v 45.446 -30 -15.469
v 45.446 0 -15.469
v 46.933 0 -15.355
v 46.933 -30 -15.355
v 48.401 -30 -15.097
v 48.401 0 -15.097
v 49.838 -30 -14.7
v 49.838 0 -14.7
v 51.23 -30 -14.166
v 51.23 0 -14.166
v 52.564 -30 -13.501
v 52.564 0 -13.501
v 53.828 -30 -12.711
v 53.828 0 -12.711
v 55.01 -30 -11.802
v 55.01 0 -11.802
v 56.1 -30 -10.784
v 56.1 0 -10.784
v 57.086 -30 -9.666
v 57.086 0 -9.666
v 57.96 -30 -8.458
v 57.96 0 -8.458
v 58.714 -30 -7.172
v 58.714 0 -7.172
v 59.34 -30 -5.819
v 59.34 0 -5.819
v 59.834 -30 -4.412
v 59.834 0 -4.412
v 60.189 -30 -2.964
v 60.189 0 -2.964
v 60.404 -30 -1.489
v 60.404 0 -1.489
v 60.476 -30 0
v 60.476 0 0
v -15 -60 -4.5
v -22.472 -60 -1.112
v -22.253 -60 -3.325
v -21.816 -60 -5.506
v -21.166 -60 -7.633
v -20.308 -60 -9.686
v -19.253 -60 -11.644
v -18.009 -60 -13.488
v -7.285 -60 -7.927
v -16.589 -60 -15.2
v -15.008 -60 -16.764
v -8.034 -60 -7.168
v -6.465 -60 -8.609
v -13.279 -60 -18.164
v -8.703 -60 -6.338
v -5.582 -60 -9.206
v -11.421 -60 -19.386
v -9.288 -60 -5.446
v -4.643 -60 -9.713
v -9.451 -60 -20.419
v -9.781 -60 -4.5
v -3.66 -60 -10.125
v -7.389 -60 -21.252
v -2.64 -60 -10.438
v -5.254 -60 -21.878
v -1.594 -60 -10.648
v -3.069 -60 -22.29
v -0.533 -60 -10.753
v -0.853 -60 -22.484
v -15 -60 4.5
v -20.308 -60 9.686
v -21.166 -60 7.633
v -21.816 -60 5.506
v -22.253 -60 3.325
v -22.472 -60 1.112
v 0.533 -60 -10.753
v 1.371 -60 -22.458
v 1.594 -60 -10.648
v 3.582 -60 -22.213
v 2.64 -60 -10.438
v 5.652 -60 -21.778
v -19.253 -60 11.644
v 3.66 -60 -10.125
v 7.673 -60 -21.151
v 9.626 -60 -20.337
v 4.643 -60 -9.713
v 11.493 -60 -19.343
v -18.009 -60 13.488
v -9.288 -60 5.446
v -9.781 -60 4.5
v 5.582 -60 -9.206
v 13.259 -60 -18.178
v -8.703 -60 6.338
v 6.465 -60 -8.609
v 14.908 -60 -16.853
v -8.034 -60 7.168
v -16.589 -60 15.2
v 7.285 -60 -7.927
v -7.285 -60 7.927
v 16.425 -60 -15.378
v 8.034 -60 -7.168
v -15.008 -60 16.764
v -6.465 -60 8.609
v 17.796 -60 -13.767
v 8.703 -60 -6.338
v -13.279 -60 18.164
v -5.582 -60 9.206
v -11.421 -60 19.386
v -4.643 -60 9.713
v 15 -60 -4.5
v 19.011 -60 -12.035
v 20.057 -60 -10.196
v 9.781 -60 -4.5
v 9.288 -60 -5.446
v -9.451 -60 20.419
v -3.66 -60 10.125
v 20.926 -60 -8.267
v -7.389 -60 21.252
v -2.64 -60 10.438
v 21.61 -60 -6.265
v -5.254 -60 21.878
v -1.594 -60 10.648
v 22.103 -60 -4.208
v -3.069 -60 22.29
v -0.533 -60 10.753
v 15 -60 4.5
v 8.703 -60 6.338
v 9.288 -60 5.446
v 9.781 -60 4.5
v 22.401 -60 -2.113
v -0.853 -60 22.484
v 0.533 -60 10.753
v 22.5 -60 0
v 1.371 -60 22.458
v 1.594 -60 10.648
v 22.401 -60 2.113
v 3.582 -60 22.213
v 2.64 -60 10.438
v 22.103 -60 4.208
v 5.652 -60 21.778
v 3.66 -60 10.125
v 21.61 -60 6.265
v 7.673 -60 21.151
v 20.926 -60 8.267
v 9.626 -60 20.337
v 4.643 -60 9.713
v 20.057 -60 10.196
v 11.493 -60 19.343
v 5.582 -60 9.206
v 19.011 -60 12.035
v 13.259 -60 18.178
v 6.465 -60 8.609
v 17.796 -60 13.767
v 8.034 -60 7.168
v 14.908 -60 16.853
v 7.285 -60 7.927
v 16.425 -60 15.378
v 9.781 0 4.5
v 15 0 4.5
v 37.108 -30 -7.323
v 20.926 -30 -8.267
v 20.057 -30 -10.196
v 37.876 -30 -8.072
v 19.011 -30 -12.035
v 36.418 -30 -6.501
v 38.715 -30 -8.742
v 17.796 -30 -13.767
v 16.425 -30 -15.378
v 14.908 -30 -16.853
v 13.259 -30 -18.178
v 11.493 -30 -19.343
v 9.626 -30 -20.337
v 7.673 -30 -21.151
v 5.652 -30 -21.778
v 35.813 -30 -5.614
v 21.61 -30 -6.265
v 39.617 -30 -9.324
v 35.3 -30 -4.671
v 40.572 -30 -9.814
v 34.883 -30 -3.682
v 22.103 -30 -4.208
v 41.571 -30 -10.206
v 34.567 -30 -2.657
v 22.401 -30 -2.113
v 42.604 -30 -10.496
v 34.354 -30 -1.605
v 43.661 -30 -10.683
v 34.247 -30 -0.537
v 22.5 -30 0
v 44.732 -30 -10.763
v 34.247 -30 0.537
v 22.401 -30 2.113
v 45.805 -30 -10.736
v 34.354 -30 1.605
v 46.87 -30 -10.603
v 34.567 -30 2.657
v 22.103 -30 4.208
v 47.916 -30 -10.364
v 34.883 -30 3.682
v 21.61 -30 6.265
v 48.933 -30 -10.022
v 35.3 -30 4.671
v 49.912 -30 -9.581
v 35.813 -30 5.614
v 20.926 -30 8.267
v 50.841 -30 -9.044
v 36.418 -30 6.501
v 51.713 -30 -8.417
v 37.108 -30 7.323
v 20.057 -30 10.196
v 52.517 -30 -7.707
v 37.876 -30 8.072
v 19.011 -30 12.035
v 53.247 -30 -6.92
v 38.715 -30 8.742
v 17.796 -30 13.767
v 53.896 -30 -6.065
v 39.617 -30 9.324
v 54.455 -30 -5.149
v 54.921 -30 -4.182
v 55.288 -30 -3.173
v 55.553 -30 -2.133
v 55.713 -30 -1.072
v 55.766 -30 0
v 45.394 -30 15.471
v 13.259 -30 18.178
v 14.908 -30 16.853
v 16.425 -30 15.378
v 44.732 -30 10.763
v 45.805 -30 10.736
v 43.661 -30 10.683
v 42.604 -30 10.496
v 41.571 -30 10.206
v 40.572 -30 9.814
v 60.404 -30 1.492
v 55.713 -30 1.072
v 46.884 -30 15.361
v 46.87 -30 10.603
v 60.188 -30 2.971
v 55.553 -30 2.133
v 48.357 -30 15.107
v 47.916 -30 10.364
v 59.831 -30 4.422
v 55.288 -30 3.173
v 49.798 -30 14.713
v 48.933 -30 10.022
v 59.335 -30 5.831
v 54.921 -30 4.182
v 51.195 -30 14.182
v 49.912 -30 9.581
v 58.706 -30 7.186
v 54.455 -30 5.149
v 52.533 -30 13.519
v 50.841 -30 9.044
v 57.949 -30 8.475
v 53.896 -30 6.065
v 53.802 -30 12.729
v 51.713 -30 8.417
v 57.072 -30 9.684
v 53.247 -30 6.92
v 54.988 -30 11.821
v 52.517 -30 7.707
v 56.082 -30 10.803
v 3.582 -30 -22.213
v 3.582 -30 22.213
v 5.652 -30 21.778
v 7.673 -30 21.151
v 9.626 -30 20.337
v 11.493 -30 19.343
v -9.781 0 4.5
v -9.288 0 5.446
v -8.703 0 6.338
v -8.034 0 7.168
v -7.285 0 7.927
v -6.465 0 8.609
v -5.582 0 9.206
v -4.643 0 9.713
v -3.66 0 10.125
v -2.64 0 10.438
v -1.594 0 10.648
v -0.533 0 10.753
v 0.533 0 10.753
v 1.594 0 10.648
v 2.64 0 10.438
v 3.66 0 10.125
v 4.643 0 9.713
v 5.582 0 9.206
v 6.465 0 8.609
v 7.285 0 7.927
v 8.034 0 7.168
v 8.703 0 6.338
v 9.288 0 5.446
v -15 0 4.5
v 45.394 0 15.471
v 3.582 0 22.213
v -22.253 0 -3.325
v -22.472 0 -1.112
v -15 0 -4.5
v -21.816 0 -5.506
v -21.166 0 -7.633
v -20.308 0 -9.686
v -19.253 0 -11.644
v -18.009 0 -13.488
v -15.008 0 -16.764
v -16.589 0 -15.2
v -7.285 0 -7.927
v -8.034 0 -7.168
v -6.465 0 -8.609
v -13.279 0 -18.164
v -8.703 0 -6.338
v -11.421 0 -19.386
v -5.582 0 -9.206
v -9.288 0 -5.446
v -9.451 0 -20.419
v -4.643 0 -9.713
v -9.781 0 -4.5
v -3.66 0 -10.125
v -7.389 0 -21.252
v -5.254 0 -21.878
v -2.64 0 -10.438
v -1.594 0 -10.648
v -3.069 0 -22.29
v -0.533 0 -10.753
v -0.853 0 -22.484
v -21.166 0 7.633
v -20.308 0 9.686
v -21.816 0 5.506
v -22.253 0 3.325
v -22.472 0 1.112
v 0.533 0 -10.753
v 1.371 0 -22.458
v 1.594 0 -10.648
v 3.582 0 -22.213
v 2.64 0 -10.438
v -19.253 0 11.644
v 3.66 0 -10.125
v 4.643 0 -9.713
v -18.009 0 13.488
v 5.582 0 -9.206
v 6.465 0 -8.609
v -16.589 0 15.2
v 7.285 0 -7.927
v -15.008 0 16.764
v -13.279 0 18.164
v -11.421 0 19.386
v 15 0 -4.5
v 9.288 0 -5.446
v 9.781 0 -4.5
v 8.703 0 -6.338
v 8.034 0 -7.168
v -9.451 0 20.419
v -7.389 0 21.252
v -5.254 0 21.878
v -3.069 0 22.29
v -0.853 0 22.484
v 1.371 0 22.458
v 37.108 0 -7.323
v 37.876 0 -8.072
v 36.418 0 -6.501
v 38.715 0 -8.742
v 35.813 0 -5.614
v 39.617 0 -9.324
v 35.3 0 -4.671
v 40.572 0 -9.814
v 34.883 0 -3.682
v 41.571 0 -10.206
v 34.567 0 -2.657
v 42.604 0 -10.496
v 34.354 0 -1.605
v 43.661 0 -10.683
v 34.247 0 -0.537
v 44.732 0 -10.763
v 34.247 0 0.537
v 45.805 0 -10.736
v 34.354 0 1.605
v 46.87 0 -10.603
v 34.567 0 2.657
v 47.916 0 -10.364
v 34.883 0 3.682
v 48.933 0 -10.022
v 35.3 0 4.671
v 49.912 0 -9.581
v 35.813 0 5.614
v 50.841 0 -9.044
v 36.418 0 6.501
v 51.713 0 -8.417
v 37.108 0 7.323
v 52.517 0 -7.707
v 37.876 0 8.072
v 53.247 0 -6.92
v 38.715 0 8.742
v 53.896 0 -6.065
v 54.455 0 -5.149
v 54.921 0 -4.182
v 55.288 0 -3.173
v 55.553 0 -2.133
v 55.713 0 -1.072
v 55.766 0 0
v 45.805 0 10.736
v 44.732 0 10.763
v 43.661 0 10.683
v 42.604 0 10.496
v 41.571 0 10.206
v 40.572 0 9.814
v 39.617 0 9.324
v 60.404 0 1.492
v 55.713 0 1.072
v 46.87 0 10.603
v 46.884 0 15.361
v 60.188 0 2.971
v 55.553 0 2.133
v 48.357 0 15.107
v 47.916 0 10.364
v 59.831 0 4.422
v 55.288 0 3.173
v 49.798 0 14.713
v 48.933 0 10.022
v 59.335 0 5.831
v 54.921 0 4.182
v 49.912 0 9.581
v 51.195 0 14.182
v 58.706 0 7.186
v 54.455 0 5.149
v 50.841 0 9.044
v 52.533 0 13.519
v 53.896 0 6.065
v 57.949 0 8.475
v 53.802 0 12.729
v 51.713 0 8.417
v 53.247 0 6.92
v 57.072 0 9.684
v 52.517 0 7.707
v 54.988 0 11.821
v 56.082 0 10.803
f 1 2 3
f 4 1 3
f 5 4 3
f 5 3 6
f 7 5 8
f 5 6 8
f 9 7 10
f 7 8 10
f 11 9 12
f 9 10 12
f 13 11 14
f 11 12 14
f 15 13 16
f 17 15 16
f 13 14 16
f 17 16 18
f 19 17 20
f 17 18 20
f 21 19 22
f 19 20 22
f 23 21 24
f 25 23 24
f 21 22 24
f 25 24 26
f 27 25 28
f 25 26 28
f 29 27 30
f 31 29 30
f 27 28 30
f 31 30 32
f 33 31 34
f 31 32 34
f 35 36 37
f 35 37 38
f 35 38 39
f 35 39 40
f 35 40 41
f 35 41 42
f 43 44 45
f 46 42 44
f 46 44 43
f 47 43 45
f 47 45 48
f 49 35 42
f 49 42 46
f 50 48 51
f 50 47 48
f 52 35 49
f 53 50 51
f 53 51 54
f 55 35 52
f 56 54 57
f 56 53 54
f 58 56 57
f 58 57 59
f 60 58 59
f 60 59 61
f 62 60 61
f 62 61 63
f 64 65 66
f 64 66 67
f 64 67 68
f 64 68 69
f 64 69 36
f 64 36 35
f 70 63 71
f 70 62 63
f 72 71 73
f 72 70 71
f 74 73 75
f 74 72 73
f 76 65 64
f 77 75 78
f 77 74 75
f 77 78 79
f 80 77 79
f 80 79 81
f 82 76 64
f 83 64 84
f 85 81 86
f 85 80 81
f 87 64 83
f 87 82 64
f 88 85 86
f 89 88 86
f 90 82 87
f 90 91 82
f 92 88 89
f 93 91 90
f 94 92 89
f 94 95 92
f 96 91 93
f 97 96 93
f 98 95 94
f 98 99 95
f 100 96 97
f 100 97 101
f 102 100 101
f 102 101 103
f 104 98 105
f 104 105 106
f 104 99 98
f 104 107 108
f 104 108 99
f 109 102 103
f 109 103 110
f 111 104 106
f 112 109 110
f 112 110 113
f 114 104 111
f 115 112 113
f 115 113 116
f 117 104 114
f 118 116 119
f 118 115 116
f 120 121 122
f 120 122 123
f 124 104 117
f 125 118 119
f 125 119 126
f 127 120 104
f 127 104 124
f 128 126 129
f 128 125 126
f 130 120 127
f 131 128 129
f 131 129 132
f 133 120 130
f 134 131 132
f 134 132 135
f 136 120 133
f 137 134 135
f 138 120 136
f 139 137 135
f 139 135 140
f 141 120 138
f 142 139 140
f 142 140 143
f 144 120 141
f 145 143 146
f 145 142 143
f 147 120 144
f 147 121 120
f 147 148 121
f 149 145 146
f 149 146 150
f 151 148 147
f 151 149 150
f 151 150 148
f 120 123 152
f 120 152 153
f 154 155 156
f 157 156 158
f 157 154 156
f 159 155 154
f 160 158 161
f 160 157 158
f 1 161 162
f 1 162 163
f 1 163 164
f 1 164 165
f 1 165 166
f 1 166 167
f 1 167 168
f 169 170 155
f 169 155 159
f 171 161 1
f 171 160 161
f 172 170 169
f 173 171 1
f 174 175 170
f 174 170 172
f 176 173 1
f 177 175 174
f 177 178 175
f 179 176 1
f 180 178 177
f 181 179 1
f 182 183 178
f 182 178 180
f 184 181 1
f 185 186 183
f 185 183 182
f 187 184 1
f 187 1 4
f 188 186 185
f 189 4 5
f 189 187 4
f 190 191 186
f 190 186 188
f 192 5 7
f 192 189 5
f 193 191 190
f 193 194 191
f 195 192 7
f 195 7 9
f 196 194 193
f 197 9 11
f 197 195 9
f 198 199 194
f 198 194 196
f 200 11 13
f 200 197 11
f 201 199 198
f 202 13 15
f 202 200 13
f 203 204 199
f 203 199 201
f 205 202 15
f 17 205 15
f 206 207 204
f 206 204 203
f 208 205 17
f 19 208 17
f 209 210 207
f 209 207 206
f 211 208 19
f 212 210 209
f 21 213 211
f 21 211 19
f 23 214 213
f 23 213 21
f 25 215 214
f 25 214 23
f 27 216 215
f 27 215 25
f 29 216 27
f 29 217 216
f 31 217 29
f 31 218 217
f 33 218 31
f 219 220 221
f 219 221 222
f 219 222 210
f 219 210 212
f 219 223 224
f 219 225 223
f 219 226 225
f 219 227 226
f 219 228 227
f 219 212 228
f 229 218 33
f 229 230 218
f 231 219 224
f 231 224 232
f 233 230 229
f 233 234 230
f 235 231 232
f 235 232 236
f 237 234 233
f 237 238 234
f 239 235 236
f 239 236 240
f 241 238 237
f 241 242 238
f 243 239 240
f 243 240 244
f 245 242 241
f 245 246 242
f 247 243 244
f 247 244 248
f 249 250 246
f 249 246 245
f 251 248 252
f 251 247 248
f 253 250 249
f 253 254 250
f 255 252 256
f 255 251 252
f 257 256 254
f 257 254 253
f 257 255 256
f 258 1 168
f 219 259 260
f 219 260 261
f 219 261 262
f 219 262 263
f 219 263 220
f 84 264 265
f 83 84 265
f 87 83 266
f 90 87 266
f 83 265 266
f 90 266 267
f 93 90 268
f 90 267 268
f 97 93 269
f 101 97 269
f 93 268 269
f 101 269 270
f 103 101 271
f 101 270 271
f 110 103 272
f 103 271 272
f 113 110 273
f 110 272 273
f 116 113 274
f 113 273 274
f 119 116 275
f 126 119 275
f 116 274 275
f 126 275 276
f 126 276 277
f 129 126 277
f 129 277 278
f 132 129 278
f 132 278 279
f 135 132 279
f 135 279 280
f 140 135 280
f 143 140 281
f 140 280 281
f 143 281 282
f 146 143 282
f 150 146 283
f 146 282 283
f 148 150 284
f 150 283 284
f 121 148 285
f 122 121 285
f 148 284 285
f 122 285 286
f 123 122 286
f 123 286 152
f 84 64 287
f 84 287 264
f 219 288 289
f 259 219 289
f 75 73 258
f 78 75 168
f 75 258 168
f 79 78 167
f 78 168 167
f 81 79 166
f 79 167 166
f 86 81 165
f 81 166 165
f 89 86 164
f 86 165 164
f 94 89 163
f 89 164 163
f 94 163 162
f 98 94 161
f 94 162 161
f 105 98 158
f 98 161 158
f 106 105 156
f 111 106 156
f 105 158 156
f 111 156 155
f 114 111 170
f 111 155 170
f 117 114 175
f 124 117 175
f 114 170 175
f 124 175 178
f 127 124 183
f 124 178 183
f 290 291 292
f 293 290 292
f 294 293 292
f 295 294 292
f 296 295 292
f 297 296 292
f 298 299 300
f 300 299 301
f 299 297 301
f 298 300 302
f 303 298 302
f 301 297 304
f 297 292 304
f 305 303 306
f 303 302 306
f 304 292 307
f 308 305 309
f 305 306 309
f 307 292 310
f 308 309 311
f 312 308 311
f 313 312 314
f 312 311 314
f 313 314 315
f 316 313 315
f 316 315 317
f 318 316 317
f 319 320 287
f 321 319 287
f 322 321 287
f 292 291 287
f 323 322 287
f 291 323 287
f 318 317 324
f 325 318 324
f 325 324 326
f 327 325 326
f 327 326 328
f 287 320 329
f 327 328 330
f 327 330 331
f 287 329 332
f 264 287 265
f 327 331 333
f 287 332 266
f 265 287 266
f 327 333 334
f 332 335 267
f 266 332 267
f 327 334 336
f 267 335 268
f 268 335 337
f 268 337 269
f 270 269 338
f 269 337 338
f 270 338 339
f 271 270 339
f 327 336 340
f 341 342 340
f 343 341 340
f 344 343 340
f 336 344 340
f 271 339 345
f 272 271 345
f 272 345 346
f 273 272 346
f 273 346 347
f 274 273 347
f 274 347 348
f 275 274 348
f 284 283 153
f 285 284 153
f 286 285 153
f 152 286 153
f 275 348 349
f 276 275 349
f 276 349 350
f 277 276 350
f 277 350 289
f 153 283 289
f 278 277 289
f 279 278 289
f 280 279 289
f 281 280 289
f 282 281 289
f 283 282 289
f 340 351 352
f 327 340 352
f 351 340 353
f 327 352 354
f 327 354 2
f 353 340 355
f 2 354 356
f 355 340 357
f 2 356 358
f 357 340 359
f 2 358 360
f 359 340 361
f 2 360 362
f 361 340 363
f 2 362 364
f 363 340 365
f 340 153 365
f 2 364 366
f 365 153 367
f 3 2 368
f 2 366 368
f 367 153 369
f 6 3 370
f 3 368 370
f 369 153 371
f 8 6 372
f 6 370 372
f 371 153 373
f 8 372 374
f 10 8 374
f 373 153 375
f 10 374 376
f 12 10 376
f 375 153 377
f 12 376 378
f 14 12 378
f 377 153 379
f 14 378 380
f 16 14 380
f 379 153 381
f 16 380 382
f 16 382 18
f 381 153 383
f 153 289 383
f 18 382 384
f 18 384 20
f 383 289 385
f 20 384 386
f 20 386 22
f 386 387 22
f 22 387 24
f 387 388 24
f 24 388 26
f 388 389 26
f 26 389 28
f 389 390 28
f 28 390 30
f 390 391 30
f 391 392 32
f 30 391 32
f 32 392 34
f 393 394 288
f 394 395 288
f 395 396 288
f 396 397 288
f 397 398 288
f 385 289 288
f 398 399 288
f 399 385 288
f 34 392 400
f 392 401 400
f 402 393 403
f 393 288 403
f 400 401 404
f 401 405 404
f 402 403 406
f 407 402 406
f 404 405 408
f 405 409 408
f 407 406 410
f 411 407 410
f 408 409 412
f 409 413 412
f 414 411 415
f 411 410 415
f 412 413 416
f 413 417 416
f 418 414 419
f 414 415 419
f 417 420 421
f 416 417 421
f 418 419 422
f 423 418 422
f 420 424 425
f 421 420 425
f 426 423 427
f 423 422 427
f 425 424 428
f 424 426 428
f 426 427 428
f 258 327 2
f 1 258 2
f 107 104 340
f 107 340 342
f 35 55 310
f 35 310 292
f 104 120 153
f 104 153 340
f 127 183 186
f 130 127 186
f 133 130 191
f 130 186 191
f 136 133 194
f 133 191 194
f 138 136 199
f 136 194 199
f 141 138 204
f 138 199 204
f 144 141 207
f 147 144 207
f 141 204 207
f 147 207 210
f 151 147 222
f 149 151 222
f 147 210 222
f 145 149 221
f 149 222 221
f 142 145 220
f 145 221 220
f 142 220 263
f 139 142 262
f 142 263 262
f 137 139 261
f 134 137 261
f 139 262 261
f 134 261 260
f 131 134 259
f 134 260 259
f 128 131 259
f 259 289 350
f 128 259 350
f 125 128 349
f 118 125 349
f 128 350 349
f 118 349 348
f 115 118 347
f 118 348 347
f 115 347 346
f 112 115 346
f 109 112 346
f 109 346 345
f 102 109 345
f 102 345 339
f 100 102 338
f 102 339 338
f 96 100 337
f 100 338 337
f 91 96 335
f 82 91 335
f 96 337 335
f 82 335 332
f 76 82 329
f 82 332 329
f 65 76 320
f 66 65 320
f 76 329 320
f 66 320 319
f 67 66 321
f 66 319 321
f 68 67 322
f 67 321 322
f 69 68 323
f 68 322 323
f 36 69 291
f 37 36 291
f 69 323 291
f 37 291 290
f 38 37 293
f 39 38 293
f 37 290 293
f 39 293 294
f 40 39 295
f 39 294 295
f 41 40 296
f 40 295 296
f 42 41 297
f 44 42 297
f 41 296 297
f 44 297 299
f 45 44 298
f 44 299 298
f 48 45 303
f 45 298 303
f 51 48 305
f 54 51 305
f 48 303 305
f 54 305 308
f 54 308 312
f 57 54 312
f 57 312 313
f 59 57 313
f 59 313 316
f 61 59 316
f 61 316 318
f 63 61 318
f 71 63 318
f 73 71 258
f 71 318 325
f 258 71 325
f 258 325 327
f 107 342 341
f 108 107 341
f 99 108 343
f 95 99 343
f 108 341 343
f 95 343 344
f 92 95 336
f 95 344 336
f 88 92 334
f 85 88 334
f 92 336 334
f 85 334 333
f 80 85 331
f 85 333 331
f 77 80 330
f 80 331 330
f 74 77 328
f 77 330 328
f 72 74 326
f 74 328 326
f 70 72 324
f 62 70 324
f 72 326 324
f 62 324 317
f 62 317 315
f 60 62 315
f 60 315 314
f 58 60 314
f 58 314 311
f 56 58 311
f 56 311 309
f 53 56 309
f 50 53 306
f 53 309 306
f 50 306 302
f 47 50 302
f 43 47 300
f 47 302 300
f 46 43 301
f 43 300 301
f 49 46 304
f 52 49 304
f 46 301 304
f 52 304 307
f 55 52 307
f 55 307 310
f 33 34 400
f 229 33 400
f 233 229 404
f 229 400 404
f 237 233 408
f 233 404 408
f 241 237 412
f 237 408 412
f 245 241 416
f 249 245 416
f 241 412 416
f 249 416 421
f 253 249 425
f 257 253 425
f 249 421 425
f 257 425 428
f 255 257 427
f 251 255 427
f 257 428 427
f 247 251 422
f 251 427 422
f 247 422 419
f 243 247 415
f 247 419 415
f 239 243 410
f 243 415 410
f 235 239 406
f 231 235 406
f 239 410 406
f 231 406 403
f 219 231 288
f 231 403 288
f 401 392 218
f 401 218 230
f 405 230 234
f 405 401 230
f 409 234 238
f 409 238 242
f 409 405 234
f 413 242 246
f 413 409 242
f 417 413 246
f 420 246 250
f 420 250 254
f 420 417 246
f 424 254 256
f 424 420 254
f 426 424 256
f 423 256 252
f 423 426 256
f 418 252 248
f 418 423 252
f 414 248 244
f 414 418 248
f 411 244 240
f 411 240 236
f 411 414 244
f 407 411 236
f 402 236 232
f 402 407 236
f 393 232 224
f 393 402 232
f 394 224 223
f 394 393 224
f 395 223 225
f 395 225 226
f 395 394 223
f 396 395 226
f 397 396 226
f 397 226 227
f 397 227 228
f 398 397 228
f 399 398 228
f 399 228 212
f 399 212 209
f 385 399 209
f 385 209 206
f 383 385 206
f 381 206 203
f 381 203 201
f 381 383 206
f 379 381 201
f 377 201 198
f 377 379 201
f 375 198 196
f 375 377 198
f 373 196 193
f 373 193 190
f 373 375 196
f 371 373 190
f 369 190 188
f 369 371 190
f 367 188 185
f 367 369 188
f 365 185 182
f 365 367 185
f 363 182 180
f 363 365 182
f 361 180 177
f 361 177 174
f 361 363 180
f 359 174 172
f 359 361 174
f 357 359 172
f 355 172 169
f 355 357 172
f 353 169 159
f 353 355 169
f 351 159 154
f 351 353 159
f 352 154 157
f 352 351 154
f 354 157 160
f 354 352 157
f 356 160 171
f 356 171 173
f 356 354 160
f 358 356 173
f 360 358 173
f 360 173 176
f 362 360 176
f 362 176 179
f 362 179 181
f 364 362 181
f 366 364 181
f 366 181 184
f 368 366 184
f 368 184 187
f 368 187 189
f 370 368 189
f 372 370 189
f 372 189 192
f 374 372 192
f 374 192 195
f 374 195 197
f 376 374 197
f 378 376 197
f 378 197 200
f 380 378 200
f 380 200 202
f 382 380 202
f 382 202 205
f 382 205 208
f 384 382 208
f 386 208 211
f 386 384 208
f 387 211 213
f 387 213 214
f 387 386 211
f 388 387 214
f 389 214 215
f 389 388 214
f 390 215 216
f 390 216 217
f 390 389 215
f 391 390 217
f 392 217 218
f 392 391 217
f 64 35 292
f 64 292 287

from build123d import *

# Parameters (mm, degrees)
F0_R     = 10.7663
F1_DEPTH = 30
F2_DEPTH = 60


# Not quite as in the source:
# - ends of sketch curves that miss each other by under 0.0002 mm in the source are joined


with BuildPart() as f1:
    # F0 (on Front) → F1 (new body)
    with BuildSketch(Plane.XZ):
        with BuildLine():
            ThreePointArc((3.5818546953, 22.2130663561), (17.1295319645, 14.5886645954), (22.5, 0))
            ThreePointArc((22.5, 0), (17.1295319492, -14.5886646134), (3.5818546487, -22.2130663636))
            Line((3.5818546487, -22.2130663636), (45.4461782926, -15.469383066))
            ThreePointArc((45.4461782926, -15.469383066), (29.5242054073, -0.0258695995), (45.3944581798, 15.4707882881))
            Line((45.3944581798, 15.4707882881), (3.5818546953, 22.2130663561))
        make_face()
        with BuildLine():
            ThreePointArc((60.4758162147, 0), (56.0816390892, 10.8026923778), (45.3944581798, 15.4707882881))
            ThreePointArc((45.3944581798, 15.4707882881), (29.5242054073, -0.0258695995), (45.4461782926, -15.469383066))
            ThreePointArc((45.4461782926, -15.469383066), (56.0996815443, -10.7841530557), (60.4758162147, 0))
        make_face()
        with Locations((45, 0)):
            Circle(F0_R, mode=Mode.SUBTRACT)
    extrude(amount=F1_DEPTH)

    # F0 (on Front) → F2 (join)
    with BuildSketch(Plane.XZ):
        with BuildLine():
            ThreePointArc((3.5818546487, -22.2130663636), (17.1295319492, -14.5886646134), (22.5, 0))
            ThreePointArc((22.5, 0), (17.1295319645, 14.5886645954), (3.5818546953, 22.2130663561))
            ThreePointArc((3.5818546953, 22.2130663561), (-22.5, 2.36e-08), (3.5818546487, -22.2130663636))
        make_face()
        with BuildLine():
            ThreePointArc((-9.780757419, 4.5), (0, 10.7663), (9.780757419, 4.5))
            Line((9.780757419, 4.5), (15, 4.5))
            Line((15, 4.5), (15, -4.5))
            Line((15, -4.5), (9.780757419, -4.5))
            ThreePointArc((9.780757419, -4.5), (0, -10.7663), (-9.780757419, -4.5))
            Line((-9.780757419, -4.5), (-15, -4.5))
            Line((-15, -4.5), (-15, 4.5))
            Line((-15, 4.5), (-9.780757419, 4.5))
        make_face(mode=Mode.SUBTRACT)
    extrude(amount=F2_DEPTH)


solid = f1.part
